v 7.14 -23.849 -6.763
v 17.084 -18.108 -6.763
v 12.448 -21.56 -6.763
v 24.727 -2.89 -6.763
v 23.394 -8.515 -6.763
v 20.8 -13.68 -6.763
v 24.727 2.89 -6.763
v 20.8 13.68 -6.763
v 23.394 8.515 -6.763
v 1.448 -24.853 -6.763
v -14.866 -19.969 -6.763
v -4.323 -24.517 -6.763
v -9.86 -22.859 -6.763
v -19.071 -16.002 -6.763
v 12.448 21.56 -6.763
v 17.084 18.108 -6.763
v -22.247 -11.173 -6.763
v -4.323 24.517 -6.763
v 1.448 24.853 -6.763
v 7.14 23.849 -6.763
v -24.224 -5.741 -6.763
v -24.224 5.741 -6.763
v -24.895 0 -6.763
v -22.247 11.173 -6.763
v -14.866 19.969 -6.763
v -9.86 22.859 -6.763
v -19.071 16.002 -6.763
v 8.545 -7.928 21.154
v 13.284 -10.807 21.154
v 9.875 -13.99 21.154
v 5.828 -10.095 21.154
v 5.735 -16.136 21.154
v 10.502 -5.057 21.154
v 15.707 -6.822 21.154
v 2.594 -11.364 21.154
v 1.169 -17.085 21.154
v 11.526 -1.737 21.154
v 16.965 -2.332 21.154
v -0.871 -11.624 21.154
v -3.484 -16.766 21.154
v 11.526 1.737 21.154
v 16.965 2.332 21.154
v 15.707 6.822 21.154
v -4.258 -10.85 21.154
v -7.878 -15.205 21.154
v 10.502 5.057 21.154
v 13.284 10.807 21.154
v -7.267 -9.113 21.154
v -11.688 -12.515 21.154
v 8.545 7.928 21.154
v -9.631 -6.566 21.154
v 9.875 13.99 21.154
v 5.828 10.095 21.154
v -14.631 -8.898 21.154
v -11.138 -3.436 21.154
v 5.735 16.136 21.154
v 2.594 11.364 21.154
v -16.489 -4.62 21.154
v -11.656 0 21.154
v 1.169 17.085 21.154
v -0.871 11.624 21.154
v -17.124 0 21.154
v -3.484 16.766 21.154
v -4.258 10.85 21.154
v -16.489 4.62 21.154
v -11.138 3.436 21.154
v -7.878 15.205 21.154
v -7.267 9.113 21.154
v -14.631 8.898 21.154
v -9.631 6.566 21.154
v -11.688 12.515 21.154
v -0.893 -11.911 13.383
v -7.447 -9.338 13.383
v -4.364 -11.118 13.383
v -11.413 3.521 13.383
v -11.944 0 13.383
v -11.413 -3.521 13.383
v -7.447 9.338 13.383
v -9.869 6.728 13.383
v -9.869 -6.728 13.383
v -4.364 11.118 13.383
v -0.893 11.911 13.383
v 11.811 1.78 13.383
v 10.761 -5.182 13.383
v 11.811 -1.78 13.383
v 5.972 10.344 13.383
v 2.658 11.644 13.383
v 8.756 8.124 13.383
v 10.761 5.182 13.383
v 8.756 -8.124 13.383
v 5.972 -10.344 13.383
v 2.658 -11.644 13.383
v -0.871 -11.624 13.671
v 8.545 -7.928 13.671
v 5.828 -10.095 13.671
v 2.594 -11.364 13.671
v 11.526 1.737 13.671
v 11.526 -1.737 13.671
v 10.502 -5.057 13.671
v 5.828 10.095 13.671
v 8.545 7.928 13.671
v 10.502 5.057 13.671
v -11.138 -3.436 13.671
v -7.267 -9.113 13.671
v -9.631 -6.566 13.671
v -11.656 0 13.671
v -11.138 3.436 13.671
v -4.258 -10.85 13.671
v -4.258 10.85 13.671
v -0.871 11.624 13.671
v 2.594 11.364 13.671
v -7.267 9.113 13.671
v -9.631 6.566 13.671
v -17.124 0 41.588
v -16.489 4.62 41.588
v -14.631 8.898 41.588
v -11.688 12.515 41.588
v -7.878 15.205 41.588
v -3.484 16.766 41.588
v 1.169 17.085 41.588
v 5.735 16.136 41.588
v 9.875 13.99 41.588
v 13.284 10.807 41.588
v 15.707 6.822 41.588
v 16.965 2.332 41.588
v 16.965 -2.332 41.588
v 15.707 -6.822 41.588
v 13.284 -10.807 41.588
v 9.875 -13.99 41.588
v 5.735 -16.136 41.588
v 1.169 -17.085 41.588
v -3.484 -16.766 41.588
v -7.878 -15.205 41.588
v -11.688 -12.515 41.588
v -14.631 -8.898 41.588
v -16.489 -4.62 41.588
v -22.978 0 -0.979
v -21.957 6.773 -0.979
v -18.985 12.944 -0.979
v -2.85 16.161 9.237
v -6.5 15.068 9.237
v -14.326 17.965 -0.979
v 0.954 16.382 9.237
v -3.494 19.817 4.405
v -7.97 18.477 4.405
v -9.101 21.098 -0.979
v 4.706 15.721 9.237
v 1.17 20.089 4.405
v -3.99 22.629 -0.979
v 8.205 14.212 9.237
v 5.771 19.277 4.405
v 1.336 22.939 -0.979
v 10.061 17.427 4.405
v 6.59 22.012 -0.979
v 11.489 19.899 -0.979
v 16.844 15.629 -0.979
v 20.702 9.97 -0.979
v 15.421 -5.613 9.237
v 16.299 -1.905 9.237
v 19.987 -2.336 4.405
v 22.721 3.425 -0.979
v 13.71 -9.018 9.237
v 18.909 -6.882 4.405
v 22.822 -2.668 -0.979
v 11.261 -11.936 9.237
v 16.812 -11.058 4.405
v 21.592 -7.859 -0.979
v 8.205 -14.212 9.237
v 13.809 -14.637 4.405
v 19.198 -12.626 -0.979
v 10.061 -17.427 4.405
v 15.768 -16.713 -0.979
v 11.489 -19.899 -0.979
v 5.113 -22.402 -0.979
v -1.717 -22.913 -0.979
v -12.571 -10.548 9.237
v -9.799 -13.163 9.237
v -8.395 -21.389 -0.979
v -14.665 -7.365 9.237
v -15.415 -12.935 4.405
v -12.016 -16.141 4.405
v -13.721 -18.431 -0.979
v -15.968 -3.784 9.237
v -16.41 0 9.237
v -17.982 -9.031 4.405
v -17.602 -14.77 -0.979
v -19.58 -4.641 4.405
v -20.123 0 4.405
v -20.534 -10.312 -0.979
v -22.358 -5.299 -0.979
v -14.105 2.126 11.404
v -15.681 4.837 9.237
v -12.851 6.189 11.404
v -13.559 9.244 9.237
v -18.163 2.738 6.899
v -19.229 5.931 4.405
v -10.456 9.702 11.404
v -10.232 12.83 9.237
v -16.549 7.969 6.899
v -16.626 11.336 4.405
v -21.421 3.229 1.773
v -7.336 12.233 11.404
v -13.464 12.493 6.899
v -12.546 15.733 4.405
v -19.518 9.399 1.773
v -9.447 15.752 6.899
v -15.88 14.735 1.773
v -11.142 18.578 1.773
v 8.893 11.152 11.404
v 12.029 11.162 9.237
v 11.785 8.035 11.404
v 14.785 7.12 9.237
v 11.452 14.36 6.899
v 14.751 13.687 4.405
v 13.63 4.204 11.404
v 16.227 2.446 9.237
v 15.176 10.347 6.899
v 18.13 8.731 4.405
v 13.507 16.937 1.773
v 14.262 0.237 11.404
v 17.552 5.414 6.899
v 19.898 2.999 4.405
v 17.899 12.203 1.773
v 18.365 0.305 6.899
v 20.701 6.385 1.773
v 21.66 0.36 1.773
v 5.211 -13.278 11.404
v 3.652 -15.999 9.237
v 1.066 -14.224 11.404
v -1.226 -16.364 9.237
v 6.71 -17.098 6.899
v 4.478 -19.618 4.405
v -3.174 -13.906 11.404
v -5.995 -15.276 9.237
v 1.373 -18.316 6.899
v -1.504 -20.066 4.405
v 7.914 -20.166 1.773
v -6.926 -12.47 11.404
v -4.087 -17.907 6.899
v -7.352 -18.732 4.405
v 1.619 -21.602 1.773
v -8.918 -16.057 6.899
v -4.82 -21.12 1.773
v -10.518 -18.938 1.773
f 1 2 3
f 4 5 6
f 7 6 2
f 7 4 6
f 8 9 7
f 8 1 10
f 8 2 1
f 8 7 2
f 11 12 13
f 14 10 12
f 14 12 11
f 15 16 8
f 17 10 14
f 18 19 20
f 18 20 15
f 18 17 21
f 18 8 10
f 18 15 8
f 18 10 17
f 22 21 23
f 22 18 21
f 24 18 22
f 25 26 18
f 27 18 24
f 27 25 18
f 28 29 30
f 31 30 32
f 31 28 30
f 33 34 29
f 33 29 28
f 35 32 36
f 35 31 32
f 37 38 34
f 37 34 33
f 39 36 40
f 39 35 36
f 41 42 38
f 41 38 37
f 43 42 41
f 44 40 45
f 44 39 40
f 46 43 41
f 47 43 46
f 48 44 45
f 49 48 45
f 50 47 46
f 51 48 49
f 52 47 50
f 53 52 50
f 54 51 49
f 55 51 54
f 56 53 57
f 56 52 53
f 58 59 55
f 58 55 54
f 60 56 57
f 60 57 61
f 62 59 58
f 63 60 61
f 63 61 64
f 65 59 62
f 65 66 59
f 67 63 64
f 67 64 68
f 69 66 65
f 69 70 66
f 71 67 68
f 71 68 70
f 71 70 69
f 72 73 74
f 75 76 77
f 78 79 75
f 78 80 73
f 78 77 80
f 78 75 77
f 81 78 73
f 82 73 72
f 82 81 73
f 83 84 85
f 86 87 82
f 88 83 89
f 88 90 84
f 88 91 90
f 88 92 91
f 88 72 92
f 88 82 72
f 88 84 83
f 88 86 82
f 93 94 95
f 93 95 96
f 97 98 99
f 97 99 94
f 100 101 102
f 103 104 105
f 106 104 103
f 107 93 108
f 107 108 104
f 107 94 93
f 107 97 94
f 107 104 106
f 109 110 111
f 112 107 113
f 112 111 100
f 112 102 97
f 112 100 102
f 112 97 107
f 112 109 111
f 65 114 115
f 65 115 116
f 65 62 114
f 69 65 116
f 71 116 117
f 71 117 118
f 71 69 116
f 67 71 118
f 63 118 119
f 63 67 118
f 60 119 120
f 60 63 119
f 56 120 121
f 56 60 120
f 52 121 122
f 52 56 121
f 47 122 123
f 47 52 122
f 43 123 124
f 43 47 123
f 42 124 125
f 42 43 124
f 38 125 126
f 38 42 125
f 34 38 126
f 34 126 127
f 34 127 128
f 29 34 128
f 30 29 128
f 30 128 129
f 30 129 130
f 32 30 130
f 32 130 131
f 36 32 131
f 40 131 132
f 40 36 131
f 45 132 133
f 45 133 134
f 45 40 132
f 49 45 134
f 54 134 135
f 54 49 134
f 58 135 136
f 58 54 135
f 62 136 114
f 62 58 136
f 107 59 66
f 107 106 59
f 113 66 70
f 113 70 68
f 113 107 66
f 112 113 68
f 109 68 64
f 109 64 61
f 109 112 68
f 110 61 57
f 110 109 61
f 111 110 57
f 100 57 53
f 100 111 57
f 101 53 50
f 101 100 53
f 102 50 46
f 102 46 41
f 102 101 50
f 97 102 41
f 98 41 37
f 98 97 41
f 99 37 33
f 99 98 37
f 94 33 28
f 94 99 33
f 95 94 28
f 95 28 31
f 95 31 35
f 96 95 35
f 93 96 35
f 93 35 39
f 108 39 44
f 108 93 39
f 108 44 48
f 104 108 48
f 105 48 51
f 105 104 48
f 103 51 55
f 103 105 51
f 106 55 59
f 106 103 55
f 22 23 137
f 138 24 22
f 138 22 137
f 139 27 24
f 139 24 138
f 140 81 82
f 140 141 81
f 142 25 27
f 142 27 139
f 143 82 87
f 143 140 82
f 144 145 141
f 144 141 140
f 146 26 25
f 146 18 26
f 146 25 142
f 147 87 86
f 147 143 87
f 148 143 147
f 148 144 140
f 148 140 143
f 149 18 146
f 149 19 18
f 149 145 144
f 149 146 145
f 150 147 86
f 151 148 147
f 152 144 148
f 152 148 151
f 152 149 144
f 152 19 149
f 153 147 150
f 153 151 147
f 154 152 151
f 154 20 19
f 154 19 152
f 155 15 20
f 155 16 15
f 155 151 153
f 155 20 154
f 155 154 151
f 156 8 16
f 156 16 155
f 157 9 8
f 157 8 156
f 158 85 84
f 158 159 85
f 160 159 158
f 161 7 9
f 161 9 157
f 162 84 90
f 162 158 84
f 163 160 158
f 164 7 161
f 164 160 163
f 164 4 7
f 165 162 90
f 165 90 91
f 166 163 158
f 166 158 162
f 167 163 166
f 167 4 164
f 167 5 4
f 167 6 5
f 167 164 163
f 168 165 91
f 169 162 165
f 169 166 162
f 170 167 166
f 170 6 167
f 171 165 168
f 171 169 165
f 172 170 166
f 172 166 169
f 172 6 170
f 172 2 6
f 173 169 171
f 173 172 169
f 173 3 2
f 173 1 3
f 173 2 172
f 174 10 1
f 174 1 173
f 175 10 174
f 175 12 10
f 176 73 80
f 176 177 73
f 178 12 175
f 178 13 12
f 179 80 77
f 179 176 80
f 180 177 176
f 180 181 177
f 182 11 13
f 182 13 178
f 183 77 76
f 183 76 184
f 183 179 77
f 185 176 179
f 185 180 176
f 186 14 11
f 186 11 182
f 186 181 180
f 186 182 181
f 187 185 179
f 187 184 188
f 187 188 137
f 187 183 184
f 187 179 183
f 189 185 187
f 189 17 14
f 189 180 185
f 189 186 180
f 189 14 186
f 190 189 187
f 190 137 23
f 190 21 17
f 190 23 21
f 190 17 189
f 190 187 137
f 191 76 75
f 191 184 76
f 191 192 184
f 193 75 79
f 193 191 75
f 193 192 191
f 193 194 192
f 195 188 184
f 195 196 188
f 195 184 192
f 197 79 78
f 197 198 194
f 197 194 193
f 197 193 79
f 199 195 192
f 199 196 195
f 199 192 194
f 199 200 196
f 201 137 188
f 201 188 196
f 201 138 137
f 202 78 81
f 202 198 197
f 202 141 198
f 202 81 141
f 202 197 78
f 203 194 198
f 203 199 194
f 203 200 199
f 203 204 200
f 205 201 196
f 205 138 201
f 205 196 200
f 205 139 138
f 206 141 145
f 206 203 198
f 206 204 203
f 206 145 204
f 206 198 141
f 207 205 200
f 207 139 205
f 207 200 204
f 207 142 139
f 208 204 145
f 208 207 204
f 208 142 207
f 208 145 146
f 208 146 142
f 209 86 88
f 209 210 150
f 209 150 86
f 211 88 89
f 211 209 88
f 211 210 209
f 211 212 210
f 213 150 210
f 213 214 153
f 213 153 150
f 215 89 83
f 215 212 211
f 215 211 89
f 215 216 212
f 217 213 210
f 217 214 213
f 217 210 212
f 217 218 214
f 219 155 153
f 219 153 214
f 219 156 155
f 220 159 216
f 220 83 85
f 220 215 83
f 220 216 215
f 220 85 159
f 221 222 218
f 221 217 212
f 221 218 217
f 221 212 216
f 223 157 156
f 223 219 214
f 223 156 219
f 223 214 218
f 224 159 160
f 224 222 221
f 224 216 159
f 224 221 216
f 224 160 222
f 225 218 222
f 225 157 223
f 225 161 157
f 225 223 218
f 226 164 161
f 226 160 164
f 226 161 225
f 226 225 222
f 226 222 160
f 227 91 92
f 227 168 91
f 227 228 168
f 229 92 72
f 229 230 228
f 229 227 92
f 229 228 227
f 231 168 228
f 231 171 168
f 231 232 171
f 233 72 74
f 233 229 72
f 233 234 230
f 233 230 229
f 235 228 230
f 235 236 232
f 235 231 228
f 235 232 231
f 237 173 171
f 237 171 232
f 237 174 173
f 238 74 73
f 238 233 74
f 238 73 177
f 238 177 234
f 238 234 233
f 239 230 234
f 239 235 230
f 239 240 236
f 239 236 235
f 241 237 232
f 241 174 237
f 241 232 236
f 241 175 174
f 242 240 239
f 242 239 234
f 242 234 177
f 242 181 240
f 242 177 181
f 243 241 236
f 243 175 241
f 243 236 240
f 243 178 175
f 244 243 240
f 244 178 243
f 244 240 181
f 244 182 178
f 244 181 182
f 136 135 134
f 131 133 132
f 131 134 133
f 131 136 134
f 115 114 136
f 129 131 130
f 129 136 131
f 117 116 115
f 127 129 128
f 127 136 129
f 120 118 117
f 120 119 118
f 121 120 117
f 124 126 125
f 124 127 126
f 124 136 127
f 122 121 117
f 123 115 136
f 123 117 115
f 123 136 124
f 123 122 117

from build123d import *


with BuildPart() as f2:
    # F0 (on Front) + F1 (on Front) → F2 (revolve)
    with BuildSketch(Plane.XZ):
        with BuildLine():
            Line((-24.895199, -6.763435), (-11.943938, 13.382968))
            ThreePointArc((-11.943938, 13.382968), (-20.122713, 4.404645), (-24.895199, -6.763435))
        make_face()
        Polygon((0, 13.382968), (-11.943938, 13.382968), (-24.895199, -6.763435), (0, -6.763435), align=None)
    with BuildSketch(Plane.XZ):
        Polygon((0, 13.670774), (0, 41.58793), (-17.124442, 41.58793), (-17.124442, 21.153724), (-11.656133, 21.153724), (-11.656133, 13.670774), align=None)
    revolve(axis=Axis((0, 0, 27.629352), (0, 0, -1)))


solid = f2.part
